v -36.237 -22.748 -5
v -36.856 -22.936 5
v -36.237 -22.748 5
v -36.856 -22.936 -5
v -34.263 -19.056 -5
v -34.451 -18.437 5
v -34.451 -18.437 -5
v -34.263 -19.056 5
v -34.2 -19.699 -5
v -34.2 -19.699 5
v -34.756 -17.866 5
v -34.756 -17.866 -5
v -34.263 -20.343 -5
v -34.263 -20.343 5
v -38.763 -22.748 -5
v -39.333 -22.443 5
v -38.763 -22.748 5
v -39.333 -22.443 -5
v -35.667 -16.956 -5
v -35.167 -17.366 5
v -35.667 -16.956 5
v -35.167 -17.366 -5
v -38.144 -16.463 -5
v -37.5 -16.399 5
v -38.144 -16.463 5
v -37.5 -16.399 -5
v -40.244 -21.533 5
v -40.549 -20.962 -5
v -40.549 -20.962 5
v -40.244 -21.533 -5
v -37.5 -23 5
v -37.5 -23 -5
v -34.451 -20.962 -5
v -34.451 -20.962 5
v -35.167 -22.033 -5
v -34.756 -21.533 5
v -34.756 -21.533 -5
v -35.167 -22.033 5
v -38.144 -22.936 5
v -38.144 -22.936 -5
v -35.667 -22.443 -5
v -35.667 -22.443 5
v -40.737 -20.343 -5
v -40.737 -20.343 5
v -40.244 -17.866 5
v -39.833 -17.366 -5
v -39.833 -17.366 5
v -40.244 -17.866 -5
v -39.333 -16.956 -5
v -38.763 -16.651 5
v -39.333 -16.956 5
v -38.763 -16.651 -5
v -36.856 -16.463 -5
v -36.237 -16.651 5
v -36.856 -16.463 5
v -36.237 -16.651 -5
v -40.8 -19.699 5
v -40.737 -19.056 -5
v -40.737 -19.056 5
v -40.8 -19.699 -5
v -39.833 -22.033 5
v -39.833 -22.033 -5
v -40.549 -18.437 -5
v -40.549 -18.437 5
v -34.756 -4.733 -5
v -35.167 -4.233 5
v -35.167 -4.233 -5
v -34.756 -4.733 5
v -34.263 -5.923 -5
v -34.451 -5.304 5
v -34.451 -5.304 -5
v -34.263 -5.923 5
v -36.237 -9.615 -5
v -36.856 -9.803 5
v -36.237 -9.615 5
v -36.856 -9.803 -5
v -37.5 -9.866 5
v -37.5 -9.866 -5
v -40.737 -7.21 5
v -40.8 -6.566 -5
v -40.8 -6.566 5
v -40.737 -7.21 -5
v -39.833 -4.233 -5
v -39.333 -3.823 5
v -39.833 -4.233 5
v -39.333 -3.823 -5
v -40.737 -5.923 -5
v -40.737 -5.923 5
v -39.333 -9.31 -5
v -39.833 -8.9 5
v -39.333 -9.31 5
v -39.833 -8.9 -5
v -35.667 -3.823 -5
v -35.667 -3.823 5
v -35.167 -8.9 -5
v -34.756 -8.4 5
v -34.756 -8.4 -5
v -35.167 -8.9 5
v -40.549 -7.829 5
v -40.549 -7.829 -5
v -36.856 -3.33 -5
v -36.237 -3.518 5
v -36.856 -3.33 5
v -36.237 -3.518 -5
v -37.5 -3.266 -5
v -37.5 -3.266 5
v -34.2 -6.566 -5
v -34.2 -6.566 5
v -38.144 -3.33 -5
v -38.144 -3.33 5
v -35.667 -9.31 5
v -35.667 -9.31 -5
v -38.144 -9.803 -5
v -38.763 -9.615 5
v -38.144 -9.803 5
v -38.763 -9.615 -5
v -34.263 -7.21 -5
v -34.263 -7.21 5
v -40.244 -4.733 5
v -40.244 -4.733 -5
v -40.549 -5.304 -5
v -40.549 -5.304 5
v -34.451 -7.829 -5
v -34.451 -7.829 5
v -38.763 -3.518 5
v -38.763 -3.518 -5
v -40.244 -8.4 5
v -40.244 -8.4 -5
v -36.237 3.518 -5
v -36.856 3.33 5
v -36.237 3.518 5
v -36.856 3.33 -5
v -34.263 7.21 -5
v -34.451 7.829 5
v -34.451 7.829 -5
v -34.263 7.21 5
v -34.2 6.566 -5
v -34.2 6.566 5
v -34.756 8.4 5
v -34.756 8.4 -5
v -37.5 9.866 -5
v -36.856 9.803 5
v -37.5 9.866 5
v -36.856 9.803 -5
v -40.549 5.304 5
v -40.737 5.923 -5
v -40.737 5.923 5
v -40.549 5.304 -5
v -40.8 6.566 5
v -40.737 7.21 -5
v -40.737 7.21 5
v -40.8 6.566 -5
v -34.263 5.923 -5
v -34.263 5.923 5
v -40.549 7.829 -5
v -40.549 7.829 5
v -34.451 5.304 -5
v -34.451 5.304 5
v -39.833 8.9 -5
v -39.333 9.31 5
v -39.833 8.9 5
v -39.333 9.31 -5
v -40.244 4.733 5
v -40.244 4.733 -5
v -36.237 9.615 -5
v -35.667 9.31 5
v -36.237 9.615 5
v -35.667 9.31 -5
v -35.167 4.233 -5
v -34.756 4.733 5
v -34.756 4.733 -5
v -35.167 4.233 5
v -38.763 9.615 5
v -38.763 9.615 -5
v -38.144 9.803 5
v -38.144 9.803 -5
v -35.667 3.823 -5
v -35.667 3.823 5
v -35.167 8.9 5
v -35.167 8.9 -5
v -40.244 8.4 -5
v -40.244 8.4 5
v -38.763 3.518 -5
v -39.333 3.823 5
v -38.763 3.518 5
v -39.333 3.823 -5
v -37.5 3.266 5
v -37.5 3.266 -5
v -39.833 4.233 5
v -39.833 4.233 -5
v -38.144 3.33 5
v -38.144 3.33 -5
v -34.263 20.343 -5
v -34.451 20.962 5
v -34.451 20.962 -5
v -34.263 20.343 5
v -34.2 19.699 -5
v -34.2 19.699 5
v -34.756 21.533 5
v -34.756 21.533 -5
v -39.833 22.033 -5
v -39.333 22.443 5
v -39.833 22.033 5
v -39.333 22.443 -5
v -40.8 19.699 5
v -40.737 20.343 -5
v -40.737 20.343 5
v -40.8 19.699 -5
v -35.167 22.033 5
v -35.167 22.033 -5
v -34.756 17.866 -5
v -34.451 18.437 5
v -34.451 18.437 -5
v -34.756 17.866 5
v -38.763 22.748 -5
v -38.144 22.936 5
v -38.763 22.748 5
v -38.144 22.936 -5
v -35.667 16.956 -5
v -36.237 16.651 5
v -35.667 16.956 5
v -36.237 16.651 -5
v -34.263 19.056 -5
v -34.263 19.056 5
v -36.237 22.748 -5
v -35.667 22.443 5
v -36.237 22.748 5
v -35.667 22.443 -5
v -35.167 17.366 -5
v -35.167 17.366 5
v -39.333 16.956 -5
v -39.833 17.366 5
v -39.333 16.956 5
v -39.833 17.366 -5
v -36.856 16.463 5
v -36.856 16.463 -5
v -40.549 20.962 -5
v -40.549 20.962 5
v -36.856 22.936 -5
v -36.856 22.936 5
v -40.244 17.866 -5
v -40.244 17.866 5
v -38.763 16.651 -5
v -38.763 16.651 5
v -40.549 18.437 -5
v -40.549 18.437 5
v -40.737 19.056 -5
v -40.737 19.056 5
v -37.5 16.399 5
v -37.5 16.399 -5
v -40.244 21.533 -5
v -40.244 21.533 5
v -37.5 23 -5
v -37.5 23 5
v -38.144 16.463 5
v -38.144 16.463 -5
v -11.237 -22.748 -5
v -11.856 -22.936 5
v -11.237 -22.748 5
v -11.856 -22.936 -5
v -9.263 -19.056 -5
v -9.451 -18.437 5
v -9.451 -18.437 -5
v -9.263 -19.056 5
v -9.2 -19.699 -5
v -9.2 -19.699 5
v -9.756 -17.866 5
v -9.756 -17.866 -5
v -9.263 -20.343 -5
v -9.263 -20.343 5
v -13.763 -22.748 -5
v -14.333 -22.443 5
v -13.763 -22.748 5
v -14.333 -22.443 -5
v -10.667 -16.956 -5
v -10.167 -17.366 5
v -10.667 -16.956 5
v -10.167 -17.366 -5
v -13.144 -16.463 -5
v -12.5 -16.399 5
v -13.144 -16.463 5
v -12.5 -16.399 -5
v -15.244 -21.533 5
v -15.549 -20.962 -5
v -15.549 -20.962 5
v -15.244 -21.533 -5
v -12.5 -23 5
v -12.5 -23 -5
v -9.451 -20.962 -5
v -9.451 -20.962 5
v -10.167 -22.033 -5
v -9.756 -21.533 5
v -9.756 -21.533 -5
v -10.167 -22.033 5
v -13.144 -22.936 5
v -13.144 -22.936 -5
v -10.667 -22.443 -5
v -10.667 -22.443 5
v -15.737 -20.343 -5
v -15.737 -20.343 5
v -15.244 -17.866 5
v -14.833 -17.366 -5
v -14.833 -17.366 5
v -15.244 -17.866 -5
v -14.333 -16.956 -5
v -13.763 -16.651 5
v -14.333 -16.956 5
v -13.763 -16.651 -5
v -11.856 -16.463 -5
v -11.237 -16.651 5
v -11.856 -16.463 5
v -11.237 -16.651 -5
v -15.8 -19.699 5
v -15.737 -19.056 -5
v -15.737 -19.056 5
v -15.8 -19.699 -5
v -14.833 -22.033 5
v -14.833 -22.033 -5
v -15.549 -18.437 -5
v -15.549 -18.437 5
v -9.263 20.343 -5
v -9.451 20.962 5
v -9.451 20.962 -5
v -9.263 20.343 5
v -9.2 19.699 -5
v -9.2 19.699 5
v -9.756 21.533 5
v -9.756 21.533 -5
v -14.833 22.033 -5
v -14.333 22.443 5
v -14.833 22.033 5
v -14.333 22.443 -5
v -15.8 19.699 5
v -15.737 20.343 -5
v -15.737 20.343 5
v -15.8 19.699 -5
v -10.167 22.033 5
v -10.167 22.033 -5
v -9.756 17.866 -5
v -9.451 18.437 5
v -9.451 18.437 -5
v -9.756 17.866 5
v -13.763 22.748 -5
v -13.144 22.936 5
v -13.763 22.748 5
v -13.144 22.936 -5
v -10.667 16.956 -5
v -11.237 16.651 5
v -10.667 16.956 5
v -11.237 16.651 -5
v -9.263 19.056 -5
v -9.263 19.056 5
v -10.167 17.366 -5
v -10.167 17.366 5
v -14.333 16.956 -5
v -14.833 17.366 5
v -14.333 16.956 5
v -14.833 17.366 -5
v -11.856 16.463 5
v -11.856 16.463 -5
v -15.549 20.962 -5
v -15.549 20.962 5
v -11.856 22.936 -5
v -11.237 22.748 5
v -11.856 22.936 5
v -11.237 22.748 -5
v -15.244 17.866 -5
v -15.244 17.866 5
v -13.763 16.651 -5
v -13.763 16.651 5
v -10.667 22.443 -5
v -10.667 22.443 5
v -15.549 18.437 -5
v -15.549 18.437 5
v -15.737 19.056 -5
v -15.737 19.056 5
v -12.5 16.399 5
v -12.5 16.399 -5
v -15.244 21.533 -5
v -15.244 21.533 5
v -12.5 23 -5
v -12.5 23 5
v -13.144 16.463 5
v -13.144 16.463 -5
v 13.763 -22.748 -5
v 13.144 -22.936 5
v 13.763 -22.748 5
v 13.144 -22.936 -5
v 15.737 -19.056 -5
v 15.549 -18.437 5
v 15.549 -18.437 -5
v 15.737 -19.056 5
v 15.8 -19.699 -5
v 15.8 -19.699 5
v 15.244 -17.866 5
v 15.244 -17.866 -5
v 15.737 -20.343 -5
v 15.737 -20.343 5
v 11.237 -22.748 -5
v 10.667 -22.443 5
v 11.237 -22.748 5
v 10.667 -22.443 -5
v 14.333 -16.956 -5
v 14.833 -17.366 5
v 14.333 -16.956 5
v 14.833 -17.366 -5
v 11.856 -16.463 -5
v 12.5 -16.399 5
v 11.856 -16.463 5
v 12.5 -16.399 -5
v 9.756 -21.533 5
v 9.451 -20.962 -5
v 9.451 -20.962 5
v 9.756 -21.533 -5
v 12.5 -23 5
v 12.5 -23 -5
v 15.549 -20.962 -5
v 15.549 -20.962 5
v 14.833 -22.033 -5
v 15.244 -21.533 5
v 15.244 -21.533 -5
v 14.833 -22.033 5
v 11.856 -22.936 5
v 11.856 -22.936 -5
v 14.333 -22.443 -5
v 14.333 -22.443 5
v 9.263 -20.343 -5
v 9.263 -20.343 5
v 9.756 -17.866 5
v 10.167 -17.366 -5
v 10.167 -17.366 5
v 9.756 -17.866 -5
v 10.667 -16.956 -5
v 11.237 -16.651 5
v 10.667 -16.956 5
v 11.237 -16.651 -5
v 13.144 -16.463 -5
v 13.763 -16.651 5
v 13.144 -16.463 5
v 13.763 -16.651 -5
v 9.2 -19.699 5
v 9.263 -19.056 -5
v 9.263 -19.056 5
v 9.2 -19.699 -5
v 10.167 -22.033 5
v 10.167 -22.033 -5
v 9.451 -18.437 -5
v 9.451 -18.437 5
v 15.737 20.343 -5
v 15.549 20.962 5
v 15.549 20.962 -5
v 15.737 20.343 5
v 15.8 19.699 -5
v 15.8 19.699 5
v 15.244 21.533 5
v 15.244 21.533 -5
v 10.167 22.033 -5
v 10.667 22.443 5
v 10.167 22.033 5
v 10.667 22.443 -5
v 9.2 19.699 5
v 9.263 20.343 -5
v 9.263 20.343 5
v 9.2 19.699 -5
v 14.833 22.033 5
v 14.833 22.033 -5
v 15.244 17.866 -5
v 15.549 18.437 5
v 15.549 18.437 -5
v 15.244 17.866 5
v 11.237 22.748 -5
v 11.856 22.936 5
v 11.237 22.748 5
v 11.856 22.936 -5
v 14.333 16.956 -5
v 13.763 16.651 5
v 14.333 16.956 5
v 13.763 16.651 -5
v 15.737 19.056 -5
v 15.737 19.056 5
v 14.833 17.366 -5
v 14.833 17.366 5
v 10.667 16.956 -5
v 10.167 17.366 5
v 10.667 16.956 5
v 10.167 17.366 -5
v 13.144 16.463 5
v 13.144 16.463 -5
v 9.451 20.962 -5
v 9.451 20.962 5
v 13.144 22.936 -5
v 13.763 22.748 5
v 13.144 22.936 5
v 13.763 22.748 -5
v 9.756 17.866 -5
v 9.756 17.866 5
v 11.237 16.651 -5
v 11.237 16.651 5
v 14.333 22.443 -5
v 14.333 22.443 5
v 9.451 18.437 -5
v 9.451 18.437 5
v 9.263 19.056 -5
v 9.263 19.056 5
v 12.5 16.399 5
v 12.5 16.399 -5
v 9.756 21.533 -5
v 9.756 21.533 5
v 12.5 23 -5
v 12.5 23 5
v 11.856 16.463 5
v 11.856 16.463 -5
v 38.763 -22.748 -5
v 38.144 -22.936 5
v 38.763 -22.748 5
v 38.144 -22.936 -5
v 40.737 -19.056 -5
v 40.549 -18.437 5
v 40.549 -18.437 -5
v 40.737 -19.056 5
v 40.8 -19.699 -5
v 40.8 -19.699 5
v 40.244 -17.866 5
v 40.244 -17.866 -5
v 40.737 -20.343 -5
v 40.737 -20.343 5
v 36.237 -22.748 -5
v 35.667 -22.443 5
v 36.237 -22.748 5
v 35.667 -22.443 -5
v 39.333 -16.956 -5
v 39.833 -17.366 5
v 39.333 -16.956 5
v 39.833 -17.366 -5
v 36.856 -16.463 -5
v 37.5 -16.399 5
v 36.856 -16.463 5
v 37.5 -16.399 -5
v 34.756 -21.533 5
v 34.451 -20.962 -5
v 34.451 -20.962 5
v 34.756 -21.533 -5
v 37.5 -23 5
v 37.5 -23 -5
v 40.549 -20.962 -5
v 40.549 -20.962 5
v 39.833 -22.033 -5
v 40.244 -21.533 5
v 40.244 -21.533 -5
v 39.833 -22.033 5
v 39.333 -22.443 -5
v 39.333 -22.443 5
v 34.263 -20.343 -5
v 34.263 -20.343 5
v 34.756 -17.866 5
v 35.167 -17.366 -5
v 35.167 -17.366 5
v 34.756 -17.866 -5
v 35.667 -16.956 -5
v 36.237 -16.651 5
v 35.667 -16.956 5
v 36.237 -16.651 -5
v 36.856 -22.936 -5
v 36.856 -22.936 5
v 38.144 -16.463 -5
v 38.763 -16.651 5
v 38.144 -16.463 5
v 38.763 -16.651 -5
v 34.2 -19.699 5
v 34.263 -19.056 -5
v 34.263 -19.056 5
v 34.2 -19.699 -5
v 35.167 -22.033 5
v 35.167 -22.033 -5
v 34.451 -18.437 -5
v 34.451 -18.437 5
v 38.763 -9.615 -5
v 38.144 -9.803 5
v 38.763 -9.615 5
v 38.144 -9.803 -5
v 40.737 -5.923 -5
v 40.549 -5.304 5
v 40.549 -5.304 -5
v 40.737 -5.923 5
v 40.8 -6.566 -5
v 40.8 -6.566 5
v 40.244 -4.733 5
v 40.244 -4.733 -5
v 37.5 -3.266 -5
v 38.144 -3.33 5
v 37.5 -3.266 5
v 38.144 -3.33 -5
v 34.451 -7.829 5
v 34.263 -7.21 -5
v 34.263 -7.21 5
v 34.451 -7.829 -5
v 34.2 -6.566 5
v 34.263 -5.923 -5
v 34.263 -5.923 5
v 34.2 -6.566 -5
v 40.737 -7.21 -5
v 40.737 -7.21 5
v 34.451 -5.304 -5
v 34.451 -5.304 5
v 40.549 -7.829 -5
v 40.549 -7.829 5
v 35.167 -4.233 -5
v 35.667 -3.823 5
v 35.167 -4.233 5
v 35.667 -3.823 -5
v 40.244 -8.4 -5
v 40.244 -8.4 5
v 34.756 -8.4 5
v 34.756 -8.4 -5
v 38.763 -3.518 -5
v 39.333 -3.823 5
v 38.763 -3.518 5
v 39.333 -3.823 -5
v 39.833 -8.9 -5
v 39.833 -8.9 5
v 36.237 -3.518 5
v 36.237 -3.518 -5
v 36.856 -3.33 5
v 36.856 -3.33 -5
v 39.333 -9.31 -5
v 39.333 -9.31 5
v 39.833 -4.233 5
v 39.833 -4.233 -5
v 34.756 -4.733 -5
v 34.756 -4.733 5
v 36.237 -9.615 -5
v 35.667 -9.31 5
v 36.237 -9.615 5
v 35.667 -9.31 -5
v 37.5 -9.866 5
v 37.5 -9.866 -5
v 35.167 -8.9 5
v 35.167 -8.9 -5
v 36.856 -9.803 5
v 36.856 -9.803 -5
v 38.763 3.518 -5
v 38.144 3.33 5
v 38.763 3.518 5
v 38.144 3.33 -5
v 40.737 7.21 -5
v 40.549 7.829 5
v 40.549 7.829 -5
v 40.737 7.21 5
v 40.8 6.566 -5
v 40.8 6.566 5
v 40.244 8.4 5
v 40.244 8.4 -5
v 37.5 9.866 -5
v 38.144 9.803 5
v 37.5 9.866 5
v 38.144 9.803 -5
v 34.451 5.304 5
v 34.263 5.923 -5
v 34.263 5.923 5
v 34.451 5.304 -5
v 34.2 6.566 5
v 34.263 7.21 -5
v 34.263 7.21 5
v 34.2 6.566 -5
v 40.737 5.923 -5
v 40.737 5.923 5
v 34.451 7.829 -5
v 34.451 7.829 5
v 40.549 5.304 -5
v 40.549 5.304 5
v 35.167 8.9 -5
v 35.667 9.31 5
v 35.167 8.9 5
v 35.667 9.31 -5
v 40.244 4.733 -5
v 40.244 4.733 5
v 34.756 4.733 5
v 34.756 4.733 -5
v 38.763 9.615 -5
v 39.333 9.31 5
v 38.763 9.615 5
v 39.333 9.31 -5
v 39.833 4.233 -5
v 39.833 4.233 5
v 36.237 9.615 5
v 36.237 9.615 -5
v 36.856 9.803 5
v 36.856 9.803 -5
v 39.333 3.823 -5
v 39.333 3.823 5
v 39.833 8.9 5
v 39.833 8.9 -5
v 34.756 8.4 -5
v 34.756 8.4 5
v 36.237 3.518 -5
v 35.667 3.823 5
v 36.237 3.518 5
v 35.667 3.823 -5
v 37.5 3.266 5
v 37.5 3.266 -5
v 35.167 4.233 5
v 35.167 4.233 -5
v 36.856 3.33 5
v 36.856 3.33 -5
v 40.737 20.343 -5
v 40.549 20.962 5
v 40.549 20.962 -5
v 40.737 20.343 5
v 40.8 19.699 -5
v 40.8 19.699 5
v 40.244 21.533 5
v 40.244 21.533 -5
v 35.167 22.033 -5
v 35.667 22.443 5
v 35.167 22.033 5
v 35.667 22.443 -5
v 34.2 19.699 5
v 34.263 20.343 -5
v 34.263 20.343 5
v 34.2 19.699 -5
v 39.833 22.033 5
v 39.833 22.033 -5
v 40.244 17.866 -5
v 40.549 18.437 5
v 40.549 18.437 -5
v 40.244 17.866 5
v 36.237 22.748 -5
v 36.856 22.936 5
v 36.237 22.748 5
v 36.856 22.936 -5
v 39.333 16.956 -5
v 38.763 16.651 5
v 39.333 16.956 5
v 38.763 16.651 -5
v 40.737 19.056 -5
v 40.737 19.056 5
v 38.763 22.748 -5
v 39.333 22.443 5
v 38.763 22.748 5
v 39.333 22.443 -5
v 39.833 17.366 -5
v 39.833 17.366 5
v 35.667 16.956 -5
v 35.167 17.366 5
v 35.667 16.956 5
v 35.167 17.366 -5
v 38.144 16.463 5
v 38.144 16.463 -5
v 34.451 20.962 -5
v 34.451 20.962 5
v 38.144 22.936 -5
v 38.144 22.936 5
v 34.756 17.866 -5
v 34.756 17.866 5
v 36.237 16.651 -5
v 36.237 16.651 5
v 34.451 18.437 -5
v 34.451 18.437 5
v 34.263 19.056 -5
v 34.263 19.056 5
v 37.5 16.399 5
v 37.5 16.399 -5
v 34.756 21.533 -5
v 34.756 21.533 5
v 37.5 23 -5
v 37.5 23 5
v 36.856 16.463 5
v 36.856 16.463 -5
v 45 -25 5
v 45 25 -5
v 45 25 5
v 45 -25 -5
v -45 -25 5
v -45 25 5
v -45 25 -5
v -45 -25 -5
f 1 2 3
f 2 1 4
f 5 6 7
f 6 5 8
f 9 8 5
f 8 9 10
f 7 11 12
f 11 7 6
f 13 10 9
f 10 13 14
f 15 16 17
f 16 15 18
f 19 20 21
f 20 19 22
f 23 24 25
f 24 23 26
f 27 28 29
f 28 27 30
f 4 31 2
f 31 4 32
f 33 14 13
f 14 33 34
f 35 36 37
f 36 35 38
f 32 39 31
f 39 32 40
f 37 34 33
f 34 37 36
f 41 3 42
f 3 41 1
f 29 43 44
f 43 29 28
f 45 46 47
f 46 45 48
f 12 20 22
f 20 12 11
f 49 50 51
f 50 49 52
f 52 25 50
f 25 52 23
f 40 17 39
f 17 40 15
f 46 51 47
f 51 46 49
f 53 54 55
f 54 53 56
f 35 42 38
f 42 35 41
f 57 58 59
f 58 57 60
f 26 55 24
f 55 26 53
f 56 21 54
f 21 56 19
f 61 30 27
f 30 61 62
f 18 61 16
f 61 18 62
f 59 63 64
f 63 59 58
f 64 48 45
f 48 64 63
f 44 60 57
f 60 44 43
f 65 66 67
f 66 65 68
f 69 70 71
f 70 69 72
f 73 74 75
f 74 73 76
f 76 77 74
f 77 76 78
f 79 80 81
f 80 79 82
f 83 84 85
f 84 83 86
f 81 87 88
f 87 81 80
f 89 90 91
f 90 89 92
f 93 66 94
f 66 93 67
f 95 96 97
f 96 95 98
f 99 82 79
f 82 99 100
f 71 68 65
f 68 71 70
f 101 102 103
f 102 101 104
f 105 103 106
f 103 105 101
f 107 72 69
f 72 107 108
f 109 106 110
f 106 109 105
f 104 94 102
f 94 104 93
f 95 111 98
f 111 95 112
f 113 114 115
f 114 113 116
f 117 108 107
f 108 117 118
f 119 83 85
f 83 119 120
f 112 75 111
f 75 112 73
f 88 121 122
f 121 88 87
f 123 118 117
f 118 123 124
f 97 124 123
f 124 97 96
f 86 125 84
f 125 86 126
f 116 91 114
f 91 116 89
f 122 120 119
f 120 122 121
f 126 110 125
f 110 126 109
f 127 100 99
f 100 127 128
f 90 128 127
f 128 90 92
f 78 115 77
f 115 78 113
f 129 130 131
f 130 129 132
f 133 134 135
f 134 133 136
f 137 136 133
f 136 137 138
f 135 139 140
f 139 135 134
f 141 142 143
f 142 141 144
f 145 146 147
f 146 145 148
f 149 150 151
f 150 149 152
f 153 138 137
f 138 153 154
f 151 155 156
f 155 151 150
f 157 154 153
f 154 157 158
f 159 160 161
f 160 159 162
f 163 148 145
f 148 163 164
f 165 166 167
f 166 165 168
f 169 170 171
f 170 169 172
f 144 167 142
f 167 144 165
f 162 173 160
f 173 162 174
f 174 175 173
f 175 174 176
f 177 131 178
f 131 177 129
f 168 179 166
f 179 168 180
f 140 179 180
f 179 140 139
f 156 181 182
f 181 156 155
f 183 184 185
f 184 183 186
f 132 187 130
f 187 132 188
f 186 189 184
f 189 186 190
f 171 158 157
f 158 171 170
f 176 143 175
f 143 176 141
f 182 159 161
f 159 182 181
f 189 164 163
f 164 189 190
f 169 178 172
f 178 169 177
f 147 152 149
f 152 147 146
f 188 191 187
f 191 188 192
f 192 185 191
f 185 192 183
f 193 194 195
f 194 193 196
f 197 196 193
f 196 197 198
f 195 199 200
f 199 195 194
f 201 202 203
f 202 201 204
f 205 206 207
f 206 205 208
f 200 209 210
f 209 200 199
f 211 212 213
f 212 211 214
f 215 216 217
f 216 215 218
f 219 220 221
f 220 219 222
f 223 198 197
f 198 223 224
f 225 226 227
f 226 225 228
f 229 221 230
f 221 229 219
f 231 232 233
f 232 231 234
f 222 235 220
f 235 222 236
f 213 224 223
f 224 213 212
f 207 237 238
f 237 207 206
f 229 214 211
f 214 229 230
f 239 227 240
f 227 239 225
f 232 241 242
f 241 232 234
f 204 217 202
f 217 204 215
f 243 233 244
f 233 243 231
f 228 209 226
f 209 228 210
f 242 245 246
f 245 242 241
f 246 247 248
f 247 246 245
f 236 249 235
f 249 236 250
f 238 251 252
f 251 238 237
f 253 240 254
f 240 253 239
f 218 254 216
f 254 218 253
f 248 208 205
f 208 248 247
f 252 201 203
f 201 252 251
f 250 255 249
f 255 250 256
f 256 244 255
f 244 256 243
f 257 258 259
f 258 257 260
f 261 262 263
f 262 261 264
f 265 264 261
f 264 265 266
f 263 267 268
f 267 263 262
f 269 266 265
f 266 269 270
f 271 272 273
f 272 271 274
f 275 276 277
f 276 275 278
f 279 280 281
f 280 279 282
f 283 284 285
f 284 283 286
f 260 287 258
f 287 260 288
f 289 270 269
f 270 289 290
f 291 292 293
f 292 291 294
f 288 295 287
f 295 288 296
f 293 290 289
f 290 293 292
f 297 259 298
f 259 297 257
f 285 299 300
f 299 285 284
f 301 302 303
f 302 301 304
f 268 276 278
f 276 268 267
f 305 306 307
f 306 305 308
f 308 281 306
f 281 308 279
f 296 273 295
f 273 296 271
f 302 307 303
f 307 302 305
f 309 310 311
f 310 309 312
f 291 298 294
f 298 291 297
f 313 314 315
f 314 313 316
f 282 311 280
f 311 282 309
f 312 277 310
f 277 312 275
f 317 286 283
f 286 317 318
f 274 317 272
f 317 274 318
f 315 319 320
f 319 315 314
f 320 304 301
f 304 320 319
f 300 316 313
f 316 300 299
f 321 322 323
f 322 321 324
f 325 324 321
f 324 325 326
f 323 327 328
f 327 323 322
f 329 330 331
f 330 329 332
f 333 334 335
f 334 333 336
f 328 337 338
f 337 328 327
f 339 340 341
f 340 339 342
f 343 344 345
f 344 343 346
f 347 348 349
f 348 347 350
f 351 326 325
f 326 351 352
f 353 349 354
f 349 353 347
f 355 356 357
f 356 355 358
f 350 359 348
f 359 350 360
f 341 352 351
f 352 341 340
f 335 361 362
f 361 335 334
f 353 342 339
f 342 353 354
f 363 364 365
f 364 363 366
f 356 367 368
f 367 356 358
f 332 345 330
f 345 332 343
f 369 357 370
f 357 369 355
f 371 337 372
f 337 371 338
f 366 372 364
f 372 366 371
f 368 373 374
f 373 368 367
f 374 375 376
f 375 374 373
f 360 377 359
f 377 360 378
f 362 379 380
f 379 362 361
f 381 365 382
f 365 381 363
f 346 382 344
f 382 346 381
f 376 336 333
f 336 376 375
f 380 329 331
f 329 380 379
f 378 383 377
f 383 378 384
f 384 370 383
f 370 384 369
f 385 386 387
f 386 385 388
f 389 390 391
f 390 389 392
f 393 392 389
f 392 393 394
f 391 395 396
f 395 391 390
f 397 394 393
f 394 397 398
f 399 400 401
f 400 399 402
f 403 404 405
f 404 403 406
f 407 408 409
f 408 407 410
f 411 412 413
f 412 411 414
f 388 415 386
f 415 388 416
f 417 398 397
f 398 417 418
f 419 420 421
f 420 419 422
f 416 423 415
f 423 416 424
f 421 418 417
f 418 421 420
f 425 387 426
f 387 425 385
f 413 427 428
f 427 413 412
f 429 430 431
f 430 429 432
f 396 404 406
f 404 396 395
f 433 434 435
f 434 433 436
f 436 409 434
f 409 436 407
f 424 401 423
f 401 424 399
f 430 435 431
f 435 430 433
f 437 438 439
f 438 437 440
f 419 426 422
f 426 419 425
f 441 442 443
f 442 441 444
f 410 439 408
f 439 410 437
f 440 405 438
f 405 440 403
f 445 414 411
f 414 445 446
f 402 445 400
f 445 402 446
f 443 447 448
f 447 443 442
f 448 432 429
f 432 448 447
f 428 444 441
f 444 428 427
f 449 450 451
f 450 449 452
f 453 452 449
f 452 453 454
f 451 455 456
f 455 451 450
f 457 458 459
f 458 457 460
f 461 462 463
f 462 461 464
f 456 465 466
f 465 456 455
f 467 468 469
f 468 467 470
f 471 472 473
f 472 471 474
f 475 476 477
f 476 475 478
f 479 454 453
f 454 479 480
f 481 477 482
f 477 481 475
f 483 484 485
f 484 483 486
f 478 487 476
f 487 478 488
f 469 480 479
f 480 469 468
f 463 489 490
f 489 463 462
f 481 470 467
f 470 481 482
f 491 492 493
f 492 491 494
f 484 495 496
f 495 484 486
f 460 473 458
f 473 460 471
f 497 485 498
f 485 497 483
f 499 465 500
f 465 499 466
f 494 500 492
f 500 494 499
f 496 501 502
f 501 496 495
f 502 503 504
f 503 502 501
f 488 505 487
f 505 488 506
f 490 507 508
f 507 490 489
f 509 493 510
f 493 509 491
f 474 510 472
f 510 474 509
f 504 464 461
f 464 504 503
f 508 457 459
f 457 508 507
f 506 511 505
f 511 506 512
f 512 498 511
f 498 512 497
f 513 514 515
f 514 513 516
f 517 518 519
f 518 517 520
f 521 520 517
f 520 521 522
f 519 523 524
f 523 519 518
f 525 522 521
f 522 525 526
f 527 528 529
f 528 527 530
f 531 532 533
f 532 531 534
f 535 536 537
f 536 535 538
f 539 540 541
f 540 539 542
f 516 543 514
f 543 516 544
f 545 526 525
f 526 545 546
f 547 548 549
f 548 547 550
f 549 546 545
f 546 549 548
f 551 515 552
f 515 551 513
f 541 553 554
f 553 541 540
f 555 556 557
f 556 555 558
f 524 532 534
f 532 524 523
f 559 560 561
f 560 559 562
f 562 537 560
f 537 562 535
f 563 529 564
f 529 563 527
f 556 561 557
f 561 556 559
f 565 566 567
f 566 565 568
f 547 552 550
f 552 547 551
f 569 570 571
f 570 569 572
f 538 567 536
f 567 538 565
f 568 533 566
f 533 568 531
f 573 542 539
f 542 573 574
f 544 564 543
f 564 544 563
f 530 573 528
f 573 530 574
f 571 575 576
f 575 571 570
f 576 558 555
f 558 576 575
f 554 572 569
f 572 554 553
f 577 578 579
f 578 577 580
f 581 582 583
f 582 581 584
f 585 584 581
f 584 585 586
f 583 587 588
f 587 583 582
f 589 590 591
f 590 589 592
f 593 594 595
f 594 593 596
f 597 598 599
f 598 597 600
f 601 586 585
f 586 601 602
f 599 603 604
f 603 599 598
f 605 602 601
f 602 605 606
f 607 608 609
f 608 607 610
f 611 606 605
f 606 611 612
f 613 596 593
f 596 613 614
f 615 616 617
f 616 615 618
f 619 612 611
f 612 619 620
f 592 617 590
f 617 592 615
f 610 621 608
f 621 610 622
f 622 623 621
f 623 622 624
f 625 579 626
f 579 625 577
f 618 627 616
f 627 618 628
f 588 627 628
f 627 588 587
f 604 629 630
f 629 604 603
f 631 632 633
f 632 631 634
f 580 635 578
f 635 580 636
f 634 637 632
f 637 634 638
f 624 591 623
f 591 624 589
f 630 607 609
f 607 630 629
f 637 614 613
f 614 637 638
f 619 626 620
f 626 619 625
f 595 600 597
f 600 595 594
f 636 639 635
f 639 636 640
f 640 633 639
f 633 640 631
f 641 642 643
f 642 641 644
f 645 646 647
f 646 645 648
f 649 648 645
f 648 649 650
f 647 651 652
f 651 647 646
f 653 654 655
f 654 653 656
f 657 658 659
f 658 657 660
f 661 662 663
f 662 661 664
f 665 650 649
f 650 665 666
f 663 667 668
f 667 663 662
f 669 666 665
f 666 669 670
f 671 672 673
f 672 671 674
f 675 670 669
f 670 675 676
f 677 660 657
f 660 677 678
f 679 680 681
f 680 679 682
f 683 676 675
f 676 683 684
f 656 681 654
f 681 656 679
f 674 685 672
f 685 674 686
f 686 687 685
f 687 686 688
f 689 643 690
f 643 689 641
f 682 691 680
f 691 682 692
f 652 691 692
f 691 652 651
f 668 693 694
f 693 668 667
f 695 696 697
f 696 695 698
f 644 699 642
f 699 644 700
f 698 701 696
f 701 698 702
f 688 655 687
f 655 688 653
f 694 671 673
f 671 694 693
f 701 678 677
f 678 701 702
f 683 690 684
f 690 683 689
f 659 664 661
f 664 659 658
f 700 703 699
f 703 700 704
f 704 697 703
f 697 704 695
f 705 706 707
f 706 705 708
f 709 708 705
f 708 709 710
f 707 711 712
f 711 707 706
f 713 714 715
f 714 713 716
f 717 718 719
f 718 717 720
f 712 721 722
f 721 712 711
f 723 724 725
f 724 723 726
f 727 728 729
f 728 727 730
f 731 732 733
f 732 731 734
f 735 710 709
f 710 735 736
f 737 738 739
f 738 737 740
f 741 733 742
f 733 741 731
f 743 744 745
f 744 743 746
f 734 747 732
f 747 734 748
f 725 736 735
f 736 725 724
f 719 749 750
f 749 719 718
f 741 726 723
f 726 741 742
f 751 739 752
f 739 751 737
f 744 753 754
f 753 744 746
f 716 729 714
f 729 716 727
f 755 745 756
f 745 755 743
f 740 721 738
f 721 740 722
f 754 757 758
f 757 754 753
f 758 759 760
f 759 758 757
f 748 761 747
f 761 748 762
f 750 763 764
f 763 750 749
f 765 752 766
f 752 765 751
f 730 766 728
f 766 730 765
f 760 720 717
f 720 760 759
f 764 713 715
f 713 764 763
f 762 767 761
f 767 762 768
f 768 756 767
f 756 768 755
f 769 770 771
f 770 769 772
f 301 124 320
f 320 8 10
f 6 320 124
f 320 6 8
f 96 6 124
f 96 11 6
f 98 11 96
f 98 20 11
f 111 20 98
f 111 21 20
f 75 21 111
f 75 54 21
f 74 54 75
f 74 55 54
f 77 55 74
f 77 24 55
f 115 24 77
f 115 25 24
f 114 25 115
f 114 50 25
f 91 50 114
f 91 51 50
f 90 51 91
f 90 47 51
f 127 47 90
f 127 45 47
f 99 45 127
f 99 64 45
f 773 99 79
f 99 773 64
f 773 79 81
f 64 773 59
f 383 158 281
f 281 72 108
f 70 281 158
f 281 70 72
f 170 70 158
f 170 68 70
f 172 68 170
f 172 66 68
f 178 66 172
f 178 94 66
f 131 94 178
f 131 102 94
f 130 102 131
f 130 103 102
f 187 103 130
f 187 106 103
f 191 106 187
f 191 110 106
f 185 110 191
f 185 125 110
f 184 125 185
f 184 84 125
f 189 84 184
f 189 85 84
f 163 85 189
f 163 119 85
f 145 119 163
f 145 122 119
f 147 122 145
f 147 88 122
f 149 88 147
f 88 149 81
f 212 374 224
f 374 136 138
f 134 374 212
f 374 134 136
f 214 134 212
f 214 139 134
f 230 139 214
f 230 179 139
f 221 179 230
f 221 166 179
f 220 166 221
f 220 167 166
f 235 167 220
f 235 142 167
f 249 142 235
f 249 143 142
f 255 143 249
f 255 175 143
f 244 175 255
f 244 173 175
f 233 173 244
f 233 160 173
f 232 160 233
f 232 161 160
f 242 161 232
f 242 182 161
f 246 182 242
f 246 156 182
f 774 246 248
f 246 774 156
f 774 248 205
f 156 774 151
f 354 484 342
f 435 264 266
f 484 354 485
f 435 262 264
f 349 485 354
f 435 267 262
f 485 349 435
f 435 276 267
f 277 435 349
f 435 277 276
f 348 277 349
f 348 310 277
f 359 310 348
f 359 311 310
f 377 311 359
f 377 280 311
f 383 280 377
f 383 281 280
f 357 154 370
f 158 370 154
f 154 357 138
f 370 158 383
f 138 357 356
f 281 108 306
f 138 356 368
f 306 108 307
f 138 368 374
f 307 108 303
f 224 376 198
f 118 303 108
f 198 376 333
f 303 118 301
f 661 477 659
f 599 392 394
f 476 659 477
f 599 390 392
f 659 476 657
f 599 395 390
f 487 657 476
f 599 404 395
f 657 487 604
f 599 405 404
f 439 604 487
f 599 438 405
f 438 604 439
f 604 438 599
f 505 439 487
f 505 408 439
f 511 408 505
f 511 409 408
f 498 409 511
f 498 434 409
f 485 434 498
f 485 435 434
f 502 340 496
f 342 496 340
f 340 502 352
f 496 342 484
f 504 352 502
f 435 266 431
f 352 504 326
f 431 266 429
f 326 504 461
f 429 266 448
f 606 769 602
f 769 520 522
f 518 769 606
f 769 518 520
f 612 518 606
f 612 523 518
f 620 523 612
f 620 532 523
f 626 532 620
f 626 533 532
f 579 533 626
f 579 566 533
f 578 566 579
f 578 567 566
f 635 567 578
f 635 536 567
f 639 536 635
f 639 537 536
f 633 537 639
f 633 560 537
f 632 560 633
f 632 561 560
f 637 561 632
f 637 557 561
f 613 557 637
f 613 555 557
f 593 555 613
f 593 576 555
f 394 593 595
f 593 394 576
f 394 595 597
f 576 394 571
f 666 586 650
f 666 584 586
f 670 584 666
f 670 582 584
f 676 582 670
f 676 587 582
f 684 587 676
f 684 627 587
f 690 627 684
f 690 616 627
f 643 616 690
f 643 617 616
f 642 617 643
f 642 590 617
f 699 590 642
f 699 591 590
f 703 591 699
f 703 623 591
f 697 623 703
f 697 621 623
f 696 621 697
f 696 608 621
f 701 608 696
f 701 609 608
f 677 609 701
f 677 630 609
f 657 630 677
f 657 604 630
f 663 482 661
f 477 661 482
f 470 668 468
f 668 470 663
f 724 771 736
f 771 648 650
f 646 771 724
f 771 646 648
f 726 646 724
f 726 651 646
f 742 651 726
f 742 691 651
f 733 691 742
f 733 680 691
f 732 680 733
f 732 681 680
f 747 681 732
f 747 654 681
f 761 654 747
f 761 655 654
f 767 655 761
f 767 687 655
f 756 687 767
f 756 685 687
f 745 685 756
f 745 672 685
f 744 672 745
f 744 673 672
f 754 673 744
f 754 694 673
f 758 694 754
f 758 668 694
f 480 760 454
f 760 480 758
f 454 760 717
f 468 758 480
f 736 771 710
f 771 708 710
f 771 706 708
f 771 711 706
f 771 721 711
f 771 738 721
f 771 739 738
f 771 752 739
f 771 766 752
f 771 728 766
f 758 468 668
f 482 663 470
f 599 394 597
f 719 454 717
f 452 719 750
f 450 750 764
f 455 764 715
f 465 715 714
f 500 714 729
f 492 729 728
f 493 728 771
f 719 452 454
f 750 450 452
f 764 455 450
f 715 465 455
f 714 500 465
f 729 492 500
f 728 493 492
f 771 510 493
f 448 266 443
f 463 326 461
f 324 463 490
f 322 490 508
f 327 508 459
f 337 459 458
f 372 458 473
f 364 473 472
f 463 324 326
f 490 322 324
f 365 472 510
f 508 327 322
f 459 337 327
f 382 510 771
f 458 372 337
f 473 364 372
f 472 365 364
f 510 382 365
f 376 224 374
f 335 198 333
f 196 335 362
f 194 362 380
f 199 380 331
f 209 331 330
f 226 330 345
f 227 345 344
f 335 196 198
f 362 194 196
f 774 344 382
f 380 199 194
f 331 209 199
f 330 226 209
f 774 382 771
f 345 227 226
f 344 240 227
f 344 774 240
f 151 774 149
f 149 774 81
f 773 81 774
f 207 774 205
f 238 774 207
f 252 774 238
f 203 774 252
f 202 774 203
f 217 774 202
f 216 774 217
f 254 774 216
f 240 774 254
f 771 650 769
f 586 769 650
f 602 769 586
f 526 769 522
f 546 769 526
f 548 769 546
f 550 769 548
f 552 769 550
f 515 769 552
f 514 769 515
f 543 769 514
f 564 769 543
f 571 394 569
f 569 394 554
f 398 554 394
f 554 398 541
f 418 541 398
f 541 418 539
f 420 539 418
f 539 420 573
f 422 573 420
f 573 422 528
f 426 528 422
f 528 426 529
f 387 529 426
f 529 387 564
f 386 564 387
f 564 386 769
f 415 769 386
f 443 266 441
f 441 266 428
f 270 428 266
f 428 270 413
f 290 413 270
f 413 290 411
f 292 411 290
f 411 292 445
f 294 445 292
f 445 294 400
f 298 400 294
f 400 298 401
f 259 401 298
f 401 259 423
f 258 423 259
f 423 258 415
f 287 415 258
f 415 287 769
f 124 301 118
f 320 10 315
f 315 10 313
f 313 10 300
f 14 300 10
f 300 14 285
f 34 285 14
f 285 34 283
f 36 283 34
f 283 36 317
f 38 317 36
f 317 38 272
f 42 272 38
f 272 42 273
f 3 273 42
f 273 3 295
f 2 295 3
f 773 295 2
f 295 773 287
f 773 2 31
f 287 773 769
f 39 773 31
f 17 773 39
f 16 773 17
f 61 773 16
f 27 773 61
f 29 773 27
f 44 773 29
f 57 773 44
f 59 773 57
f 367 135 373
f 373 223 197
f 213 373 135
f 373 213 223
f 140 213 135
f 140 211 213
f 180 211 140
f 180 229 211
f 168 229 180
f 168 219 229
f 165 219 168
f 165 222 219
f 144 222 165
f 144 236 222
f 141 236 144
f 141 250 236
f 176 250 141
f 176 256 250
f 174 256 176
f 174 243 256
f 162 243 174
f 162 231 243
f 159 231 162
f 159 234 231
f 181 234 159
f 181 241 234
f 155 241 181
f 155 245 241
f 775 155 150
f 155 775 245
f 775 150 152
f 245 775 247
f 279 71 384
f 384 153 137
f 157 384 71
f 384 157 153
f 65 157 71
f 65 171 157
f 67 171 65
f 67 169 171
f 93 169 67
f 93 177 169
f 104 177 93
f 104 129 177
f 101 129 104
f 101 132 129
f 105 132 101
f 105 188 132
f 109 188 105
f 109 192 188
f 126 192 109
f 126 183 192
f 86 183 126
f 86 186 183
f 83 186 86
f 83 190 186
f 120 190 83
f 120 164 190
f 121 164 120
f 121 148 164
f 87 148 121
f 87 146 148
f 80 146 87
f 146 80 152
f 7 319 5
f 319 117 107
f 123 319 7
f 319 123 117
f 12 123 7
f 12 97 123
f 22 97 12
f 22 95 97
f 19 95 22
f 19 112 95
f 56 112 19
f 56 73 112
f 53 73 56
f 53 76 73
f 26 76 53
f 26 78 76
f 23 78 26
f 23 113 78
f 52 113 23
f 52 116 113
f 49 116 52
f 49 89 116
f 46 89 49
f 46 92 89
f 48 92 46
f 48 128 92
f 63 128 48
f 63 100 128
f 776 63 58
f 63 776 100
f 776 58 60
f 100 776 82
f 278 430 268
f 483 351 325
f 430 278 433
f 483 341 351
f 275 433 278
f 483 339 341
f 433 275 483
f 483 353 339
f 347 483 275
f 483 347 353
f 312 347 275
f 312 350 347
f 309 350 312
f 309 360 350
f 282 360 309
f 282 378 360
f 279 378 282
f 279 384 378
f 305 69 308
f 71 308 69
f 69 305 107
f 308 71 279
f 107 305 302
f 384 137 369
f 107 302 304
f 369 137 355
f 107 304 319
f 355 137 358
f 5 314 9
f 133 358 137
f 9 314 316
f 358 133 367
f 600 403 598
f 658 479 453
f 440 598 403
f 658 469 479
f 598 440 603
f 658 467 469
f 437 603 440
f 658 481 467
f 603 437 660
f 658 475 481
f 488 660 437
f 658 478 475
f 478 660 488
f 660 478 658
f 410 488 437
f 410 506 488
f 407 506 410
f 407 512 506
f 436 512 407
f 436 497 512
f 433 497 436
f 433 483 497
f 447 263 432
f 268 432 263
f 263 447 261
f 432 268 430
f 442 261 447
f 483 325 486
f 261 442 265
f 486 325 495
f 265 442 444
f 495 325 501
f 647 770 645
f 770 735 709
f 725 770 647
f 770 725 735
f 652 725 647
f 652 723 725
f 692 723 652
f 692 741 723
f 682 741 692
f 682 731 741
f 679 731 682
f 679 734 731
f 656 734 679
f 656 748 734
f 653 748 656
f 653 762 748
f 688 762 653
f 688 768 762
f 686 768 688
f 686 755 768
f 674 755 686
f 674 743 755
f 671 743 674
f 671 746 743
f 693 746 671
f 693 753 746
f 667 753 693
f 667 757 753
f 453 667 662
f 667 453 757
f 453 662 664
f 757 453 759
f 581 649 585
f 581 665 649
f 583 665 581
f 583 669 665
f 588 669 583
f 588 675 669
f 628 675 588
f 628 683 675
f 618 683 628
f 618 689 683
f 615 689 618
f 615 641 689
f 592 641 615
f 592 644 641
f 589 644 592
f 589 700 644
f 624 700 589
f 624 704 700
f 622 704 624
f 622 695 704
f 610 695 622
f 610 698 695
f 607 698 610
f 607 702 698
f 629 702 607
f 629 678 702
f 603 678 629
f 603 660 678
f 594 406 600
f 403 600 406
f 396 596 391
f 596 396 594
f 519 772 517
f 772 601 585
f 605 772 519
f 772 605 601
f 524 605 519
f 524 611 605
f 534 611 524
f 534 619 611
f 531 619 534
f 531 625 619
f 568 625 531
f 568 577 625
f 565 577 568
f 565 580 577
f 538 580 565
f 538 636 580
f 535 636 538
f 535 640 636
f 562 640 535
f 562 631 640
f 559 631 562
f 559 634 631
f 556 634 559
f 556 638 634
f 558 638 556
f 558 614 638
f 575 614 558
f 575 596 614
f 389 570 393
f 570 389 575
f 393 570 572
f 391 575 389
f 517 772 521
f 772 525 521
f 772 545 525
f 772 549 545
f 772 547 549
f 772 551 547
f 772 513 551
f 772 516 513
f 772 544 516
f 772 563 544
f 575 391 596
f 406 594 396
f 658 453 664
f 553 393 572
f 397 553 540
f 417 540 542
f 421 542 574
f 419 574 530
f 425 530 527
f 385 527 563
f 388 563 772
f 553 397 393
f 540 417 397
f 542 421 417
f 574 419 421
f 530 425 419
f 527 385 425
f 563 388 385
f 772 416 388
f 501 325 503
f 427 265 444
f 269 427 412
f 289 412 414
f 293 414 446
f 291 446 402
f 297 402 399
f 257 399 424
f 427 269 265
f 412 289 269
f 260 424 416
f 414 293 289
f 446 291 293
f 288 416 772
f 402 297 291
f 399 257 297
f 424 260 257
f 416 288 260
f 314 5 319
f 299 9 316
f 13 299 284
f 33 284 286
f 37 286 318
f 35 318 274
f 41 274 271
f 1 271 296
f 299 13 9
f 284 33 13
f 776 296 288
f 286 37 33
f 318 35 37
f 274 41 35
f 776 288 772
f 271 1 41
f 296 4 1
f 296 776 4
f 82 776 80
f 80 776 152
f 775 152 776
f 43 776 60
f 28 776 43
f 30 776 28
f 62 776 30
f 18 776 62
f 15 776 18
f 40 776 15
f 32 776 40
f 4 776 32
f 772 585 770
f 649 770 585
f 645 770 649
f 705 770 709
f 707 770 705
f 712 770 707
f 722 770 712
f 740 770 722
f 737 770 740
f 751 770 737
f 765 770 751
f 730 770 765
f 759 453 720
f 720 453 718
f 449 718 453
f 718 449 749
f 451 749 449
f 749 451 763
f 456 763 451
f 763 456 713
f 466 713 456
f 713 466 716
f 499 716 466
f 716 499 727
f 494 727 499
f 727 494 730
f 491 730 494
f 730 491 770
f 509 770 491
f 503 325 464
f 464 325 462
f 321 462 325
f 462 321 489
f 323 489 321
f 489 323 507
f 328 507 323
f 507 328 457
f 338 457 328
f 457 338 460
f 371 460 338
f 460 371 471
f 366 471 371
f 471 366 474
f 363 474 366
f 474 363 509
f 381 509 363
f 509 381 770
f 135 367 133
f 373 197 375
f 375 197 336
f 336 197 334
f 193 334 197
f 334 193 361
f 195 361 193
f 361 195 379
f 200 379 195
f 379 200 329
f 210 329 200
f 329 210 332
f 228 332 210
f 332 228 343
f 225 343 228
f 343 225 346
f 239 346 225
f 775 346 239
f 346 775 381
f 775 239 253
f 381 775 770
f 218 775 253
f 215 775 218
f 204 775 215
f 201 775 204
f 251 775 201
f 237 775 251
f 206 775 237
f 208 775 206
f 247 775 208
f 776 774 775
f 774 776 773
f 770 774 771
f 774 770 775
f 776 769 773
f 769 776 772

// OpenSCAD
$fn = 32;

// ----------------------------------------------------------------------
// Perforated panel 90 x 50 x 10
// 4 x 4 Ø6.6 holes, frame layout
// ----------------------------------------------------------------------

// --- parameters (mm) ---
panel = [90, 50, 10];  // overall size (x, y, z)
hole_d = 6.6;          // hole diameter
pitch_x = 25;          // hole pitch along X
pitch_y = 13.133;      // hole pitch along Y

// --- derived feature positions (mm) ---
margin = hole_d / 2 + 2;            // = 5.3   clearance from the panel edge
cols = floor((panel[0] - 2 * margin) / pitch_x) + 1;  // = 4   how many columns fit in X
rows = floor((panel[1] - 2 * margin) / pitch_y) + 1;  // = 4   how many rows fit in Y
span_x = (cols - 1) * pitch_x + 0;  // = 75   width of the field
span_y = (rows - 1) * pitch_y;      // = 39.4   height of the field
origin_x = -span_x / 2;             // = -37.5   X of the first hole
origin_y = -span_y / 2;             // = -19.7   Y of the first row
holes = 2 * cols + 2 * (rows - 2);  // = 12   holes around the frame
feature_centers = [
  [origin_x + 0 * pitch_x, origin_y + 0 * pitch_y],
  [origin_x + 0 * pitch_x, origin_y + 1 * pitch_y],
  [origin_x + 0 * pitch_x, origin_y + 2 * pitch_y],
  [origin_x + 0 * pitch_x, origin_y + 3 * pitch_y],
  [origin_x + 1 * pitch_x, origin_y + 0 * pitch_y],
  [origin_x + 1 * pitch_x, origin_y + 3 * pitch_y],
  [origin_x + 2 * pitch_x, origin_y + 0 * pitch_y],
  [origin_x + 2 * pitch_x, origin_y + 3 * pitch_y],
  [origin_x + 3 * pitch_x, origin_y + 0 * pitch_y],
  [origin_x + 3 * pitch_x, origin_y + 1 * pitch_y],
  [origin_x + 3 * pitch_x, origin_y + 2 * pitch_y],
  [origin_x + 3 * pitch_x, origin_y + 3 * pitch_y]
];   // hole centres, used verbatim by the cutter loop

// panel outline, every hole through
difference() {
  cube(panel, center = true);
  for (centre = feature_centers)
    translate([centre[0], centre[1], 0])
      cylinder(d = hole_d, h = panel[2] + 2, center = true);
}
